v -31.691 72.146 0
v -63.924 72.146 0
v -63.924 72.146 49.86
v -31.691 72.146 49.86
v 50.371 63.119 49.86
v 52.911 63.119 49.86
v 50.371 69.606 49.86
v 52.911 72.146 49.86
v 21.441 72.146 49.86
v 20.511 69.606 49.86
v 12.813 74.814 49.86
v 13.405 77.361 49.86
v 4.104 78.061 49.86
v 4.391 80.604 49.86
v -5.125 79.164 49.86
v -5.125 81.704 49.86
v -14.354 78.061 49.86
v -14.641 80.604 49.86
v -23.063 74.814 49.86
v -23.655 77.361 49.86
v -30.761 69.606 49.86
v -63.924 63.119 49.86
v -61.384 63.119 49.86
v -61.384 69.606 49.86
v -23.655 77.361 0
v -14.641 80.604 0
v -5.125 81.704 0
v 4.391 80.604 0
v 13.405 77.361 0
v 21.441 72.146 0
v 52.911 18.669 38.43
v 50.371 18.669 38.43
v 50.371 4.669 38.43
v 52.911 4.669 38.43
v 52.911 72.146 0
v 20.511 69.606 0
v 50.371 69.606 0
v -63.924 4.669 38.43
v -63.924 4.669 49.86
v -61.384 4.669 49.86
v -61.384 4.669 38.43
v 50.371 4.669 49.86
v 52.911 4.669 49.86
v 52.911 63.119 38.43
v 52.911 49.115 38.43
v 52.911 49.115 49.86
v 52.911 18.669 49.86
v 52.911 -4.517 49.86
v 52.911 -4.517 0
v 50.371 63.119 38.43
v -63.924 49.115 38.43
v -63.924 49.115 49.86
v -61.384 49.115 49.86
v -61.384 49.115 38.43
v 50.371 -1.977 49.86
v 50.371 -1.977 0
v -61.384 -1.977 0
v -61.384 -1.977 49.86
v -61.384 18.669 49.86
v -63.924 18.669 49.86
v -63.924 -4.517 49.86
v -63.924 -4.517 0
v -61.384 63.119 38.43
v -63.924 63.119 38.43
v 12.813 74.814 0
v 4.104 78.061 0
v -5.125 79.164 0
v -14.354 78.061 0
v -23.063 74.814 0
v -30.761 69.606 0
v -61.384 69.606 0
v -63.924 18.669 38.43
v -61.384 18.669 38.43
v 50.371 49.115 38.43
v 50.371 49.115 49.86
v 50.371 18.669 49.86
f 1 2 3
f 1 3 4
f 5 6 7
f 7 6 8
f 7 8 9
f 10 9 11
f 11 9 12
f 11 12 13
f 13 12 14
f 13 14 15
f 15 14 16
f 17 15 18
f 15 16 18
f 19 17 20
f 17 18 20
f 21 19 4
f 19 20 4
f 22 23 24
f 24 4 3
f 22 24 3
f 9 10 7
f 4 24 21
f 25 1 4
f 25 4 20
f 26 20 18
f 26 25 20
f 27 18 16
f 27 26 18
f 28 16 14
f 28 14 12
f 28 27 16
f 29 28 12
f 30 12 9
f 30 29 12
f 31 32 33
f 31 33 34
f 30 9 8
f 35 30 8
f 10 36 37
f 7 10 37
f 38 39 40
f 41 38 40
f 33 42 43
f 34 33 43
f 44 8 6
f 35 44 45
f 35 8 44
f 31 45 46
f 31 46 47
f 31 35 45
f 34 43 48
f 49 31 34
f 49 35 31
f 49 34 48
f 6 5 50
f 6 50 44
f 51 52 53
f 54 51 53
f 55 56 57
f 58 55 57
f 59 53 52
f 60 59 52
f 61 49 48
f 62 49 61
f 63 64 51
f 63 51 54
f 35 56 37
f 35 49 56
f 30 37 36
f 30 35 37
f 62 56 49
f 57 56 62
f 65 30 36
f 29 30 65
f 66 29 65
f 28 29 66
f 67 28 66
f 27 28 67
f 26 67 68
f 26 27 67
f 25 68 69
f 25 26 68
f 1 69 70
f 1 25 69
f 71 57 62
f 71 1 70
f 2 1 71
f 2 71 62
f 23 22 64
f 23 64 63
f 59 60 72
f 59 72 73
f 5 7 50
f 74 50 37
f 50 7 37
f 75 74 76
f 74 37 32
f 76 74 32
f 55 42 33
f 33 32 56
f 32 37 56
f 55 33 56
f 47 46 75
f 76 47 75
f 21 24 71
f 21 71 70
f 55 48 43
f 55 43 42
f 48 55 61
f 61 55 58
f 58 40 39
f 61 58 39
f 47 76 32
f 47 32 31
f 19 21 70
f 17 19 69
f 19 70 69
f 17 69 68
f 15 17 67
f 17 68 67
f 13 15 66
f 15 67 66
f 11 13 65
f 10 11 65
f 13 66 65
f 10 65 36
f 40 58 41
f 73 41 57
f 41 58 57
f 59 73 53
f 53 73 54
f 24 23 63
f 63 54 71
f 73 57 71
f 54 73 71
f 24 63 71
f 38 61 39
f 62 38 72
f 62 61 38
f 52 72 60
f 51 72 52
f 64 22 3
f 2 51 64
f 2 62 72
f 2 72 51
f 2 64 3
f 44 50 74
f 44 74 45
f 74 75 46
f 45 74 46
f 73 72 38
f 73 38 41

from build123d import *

# Parameters (mm, degrees)
BOSS_EXTRUDE2_DEPTH = 49.8602
SHELL2_T            = 2.54
SKETCH4_W           = 2.54
SKETCH4_H           = 14.004037607
SKETCH4_H_2         = 14.000022482
SKETCH4_H_3         = 14.004058035
CUT_EXTRUDE1_DEPTH  = 11.43


with BuildPart() as part:
    # Sketch2 → Boss-Extrude2 (new body)
    with BuildSketch(Plane.XY):
        with BuildLine():
            Line((20.510960331, 69.60596379), (50.371443222, 69.60596379))
            Line((50.371443222, 69.60596379), (50.371443222, -1.977240525))
            Line((50.371443222, -1.977240525), (-61.38356009, -1.977240525))
            Line((-61.38356009, -1.977240525), (-61.38356009, 69.60596379))
            Line((-61.38356009, 69.60596379), (-30.761077997, 69.60596379))
            ThreePointArc((-30.761077997, 69.60596379), (-5.125058833, 79.163961442), (20.510960331, 69.60596379))
        make_face()
    extrude(amount=BOSS_EXTRUDE2_DEPTH)

    # Shell2
    shell2_openings = [part.faces().sort_by_distance(p)[0] for p in [
        (-5.490717903, 35.411141446, 0),
        (-5.490717903, 35.411141446, 49.8602),
    ]]
    offset(amount=SHELL2_T, openings=shell2_openings, kind=Kind.INTERSECTION)

    # Sketch4 → Cut-Extrude1 (cut)
    with BuildSketch(Plane.XY.offset(49.8602)):
        with Locations((-62.65356009, 56.116943469)):
            Rectangle(SKETCH4_W, SKETCH4_H)
        with Locations((-62.65356009, 11.668972532)):
            Rectangle(SKETCH4_W, SKETCH4_H_2)
        with Locations((51.641443222, 56.116953683)):
            Rectangle(SKETCH4_W, SKETCH4_H_3)
        with Locations((51.641443222, 11.668972532)):
            Rectangle(SKETCH4_W, SKETCH4_H_2)
    extrude(amount=-CUT_EXTRUDE1_DEPTH, mode=Mode.SUBTRACT)


solid = part.part
